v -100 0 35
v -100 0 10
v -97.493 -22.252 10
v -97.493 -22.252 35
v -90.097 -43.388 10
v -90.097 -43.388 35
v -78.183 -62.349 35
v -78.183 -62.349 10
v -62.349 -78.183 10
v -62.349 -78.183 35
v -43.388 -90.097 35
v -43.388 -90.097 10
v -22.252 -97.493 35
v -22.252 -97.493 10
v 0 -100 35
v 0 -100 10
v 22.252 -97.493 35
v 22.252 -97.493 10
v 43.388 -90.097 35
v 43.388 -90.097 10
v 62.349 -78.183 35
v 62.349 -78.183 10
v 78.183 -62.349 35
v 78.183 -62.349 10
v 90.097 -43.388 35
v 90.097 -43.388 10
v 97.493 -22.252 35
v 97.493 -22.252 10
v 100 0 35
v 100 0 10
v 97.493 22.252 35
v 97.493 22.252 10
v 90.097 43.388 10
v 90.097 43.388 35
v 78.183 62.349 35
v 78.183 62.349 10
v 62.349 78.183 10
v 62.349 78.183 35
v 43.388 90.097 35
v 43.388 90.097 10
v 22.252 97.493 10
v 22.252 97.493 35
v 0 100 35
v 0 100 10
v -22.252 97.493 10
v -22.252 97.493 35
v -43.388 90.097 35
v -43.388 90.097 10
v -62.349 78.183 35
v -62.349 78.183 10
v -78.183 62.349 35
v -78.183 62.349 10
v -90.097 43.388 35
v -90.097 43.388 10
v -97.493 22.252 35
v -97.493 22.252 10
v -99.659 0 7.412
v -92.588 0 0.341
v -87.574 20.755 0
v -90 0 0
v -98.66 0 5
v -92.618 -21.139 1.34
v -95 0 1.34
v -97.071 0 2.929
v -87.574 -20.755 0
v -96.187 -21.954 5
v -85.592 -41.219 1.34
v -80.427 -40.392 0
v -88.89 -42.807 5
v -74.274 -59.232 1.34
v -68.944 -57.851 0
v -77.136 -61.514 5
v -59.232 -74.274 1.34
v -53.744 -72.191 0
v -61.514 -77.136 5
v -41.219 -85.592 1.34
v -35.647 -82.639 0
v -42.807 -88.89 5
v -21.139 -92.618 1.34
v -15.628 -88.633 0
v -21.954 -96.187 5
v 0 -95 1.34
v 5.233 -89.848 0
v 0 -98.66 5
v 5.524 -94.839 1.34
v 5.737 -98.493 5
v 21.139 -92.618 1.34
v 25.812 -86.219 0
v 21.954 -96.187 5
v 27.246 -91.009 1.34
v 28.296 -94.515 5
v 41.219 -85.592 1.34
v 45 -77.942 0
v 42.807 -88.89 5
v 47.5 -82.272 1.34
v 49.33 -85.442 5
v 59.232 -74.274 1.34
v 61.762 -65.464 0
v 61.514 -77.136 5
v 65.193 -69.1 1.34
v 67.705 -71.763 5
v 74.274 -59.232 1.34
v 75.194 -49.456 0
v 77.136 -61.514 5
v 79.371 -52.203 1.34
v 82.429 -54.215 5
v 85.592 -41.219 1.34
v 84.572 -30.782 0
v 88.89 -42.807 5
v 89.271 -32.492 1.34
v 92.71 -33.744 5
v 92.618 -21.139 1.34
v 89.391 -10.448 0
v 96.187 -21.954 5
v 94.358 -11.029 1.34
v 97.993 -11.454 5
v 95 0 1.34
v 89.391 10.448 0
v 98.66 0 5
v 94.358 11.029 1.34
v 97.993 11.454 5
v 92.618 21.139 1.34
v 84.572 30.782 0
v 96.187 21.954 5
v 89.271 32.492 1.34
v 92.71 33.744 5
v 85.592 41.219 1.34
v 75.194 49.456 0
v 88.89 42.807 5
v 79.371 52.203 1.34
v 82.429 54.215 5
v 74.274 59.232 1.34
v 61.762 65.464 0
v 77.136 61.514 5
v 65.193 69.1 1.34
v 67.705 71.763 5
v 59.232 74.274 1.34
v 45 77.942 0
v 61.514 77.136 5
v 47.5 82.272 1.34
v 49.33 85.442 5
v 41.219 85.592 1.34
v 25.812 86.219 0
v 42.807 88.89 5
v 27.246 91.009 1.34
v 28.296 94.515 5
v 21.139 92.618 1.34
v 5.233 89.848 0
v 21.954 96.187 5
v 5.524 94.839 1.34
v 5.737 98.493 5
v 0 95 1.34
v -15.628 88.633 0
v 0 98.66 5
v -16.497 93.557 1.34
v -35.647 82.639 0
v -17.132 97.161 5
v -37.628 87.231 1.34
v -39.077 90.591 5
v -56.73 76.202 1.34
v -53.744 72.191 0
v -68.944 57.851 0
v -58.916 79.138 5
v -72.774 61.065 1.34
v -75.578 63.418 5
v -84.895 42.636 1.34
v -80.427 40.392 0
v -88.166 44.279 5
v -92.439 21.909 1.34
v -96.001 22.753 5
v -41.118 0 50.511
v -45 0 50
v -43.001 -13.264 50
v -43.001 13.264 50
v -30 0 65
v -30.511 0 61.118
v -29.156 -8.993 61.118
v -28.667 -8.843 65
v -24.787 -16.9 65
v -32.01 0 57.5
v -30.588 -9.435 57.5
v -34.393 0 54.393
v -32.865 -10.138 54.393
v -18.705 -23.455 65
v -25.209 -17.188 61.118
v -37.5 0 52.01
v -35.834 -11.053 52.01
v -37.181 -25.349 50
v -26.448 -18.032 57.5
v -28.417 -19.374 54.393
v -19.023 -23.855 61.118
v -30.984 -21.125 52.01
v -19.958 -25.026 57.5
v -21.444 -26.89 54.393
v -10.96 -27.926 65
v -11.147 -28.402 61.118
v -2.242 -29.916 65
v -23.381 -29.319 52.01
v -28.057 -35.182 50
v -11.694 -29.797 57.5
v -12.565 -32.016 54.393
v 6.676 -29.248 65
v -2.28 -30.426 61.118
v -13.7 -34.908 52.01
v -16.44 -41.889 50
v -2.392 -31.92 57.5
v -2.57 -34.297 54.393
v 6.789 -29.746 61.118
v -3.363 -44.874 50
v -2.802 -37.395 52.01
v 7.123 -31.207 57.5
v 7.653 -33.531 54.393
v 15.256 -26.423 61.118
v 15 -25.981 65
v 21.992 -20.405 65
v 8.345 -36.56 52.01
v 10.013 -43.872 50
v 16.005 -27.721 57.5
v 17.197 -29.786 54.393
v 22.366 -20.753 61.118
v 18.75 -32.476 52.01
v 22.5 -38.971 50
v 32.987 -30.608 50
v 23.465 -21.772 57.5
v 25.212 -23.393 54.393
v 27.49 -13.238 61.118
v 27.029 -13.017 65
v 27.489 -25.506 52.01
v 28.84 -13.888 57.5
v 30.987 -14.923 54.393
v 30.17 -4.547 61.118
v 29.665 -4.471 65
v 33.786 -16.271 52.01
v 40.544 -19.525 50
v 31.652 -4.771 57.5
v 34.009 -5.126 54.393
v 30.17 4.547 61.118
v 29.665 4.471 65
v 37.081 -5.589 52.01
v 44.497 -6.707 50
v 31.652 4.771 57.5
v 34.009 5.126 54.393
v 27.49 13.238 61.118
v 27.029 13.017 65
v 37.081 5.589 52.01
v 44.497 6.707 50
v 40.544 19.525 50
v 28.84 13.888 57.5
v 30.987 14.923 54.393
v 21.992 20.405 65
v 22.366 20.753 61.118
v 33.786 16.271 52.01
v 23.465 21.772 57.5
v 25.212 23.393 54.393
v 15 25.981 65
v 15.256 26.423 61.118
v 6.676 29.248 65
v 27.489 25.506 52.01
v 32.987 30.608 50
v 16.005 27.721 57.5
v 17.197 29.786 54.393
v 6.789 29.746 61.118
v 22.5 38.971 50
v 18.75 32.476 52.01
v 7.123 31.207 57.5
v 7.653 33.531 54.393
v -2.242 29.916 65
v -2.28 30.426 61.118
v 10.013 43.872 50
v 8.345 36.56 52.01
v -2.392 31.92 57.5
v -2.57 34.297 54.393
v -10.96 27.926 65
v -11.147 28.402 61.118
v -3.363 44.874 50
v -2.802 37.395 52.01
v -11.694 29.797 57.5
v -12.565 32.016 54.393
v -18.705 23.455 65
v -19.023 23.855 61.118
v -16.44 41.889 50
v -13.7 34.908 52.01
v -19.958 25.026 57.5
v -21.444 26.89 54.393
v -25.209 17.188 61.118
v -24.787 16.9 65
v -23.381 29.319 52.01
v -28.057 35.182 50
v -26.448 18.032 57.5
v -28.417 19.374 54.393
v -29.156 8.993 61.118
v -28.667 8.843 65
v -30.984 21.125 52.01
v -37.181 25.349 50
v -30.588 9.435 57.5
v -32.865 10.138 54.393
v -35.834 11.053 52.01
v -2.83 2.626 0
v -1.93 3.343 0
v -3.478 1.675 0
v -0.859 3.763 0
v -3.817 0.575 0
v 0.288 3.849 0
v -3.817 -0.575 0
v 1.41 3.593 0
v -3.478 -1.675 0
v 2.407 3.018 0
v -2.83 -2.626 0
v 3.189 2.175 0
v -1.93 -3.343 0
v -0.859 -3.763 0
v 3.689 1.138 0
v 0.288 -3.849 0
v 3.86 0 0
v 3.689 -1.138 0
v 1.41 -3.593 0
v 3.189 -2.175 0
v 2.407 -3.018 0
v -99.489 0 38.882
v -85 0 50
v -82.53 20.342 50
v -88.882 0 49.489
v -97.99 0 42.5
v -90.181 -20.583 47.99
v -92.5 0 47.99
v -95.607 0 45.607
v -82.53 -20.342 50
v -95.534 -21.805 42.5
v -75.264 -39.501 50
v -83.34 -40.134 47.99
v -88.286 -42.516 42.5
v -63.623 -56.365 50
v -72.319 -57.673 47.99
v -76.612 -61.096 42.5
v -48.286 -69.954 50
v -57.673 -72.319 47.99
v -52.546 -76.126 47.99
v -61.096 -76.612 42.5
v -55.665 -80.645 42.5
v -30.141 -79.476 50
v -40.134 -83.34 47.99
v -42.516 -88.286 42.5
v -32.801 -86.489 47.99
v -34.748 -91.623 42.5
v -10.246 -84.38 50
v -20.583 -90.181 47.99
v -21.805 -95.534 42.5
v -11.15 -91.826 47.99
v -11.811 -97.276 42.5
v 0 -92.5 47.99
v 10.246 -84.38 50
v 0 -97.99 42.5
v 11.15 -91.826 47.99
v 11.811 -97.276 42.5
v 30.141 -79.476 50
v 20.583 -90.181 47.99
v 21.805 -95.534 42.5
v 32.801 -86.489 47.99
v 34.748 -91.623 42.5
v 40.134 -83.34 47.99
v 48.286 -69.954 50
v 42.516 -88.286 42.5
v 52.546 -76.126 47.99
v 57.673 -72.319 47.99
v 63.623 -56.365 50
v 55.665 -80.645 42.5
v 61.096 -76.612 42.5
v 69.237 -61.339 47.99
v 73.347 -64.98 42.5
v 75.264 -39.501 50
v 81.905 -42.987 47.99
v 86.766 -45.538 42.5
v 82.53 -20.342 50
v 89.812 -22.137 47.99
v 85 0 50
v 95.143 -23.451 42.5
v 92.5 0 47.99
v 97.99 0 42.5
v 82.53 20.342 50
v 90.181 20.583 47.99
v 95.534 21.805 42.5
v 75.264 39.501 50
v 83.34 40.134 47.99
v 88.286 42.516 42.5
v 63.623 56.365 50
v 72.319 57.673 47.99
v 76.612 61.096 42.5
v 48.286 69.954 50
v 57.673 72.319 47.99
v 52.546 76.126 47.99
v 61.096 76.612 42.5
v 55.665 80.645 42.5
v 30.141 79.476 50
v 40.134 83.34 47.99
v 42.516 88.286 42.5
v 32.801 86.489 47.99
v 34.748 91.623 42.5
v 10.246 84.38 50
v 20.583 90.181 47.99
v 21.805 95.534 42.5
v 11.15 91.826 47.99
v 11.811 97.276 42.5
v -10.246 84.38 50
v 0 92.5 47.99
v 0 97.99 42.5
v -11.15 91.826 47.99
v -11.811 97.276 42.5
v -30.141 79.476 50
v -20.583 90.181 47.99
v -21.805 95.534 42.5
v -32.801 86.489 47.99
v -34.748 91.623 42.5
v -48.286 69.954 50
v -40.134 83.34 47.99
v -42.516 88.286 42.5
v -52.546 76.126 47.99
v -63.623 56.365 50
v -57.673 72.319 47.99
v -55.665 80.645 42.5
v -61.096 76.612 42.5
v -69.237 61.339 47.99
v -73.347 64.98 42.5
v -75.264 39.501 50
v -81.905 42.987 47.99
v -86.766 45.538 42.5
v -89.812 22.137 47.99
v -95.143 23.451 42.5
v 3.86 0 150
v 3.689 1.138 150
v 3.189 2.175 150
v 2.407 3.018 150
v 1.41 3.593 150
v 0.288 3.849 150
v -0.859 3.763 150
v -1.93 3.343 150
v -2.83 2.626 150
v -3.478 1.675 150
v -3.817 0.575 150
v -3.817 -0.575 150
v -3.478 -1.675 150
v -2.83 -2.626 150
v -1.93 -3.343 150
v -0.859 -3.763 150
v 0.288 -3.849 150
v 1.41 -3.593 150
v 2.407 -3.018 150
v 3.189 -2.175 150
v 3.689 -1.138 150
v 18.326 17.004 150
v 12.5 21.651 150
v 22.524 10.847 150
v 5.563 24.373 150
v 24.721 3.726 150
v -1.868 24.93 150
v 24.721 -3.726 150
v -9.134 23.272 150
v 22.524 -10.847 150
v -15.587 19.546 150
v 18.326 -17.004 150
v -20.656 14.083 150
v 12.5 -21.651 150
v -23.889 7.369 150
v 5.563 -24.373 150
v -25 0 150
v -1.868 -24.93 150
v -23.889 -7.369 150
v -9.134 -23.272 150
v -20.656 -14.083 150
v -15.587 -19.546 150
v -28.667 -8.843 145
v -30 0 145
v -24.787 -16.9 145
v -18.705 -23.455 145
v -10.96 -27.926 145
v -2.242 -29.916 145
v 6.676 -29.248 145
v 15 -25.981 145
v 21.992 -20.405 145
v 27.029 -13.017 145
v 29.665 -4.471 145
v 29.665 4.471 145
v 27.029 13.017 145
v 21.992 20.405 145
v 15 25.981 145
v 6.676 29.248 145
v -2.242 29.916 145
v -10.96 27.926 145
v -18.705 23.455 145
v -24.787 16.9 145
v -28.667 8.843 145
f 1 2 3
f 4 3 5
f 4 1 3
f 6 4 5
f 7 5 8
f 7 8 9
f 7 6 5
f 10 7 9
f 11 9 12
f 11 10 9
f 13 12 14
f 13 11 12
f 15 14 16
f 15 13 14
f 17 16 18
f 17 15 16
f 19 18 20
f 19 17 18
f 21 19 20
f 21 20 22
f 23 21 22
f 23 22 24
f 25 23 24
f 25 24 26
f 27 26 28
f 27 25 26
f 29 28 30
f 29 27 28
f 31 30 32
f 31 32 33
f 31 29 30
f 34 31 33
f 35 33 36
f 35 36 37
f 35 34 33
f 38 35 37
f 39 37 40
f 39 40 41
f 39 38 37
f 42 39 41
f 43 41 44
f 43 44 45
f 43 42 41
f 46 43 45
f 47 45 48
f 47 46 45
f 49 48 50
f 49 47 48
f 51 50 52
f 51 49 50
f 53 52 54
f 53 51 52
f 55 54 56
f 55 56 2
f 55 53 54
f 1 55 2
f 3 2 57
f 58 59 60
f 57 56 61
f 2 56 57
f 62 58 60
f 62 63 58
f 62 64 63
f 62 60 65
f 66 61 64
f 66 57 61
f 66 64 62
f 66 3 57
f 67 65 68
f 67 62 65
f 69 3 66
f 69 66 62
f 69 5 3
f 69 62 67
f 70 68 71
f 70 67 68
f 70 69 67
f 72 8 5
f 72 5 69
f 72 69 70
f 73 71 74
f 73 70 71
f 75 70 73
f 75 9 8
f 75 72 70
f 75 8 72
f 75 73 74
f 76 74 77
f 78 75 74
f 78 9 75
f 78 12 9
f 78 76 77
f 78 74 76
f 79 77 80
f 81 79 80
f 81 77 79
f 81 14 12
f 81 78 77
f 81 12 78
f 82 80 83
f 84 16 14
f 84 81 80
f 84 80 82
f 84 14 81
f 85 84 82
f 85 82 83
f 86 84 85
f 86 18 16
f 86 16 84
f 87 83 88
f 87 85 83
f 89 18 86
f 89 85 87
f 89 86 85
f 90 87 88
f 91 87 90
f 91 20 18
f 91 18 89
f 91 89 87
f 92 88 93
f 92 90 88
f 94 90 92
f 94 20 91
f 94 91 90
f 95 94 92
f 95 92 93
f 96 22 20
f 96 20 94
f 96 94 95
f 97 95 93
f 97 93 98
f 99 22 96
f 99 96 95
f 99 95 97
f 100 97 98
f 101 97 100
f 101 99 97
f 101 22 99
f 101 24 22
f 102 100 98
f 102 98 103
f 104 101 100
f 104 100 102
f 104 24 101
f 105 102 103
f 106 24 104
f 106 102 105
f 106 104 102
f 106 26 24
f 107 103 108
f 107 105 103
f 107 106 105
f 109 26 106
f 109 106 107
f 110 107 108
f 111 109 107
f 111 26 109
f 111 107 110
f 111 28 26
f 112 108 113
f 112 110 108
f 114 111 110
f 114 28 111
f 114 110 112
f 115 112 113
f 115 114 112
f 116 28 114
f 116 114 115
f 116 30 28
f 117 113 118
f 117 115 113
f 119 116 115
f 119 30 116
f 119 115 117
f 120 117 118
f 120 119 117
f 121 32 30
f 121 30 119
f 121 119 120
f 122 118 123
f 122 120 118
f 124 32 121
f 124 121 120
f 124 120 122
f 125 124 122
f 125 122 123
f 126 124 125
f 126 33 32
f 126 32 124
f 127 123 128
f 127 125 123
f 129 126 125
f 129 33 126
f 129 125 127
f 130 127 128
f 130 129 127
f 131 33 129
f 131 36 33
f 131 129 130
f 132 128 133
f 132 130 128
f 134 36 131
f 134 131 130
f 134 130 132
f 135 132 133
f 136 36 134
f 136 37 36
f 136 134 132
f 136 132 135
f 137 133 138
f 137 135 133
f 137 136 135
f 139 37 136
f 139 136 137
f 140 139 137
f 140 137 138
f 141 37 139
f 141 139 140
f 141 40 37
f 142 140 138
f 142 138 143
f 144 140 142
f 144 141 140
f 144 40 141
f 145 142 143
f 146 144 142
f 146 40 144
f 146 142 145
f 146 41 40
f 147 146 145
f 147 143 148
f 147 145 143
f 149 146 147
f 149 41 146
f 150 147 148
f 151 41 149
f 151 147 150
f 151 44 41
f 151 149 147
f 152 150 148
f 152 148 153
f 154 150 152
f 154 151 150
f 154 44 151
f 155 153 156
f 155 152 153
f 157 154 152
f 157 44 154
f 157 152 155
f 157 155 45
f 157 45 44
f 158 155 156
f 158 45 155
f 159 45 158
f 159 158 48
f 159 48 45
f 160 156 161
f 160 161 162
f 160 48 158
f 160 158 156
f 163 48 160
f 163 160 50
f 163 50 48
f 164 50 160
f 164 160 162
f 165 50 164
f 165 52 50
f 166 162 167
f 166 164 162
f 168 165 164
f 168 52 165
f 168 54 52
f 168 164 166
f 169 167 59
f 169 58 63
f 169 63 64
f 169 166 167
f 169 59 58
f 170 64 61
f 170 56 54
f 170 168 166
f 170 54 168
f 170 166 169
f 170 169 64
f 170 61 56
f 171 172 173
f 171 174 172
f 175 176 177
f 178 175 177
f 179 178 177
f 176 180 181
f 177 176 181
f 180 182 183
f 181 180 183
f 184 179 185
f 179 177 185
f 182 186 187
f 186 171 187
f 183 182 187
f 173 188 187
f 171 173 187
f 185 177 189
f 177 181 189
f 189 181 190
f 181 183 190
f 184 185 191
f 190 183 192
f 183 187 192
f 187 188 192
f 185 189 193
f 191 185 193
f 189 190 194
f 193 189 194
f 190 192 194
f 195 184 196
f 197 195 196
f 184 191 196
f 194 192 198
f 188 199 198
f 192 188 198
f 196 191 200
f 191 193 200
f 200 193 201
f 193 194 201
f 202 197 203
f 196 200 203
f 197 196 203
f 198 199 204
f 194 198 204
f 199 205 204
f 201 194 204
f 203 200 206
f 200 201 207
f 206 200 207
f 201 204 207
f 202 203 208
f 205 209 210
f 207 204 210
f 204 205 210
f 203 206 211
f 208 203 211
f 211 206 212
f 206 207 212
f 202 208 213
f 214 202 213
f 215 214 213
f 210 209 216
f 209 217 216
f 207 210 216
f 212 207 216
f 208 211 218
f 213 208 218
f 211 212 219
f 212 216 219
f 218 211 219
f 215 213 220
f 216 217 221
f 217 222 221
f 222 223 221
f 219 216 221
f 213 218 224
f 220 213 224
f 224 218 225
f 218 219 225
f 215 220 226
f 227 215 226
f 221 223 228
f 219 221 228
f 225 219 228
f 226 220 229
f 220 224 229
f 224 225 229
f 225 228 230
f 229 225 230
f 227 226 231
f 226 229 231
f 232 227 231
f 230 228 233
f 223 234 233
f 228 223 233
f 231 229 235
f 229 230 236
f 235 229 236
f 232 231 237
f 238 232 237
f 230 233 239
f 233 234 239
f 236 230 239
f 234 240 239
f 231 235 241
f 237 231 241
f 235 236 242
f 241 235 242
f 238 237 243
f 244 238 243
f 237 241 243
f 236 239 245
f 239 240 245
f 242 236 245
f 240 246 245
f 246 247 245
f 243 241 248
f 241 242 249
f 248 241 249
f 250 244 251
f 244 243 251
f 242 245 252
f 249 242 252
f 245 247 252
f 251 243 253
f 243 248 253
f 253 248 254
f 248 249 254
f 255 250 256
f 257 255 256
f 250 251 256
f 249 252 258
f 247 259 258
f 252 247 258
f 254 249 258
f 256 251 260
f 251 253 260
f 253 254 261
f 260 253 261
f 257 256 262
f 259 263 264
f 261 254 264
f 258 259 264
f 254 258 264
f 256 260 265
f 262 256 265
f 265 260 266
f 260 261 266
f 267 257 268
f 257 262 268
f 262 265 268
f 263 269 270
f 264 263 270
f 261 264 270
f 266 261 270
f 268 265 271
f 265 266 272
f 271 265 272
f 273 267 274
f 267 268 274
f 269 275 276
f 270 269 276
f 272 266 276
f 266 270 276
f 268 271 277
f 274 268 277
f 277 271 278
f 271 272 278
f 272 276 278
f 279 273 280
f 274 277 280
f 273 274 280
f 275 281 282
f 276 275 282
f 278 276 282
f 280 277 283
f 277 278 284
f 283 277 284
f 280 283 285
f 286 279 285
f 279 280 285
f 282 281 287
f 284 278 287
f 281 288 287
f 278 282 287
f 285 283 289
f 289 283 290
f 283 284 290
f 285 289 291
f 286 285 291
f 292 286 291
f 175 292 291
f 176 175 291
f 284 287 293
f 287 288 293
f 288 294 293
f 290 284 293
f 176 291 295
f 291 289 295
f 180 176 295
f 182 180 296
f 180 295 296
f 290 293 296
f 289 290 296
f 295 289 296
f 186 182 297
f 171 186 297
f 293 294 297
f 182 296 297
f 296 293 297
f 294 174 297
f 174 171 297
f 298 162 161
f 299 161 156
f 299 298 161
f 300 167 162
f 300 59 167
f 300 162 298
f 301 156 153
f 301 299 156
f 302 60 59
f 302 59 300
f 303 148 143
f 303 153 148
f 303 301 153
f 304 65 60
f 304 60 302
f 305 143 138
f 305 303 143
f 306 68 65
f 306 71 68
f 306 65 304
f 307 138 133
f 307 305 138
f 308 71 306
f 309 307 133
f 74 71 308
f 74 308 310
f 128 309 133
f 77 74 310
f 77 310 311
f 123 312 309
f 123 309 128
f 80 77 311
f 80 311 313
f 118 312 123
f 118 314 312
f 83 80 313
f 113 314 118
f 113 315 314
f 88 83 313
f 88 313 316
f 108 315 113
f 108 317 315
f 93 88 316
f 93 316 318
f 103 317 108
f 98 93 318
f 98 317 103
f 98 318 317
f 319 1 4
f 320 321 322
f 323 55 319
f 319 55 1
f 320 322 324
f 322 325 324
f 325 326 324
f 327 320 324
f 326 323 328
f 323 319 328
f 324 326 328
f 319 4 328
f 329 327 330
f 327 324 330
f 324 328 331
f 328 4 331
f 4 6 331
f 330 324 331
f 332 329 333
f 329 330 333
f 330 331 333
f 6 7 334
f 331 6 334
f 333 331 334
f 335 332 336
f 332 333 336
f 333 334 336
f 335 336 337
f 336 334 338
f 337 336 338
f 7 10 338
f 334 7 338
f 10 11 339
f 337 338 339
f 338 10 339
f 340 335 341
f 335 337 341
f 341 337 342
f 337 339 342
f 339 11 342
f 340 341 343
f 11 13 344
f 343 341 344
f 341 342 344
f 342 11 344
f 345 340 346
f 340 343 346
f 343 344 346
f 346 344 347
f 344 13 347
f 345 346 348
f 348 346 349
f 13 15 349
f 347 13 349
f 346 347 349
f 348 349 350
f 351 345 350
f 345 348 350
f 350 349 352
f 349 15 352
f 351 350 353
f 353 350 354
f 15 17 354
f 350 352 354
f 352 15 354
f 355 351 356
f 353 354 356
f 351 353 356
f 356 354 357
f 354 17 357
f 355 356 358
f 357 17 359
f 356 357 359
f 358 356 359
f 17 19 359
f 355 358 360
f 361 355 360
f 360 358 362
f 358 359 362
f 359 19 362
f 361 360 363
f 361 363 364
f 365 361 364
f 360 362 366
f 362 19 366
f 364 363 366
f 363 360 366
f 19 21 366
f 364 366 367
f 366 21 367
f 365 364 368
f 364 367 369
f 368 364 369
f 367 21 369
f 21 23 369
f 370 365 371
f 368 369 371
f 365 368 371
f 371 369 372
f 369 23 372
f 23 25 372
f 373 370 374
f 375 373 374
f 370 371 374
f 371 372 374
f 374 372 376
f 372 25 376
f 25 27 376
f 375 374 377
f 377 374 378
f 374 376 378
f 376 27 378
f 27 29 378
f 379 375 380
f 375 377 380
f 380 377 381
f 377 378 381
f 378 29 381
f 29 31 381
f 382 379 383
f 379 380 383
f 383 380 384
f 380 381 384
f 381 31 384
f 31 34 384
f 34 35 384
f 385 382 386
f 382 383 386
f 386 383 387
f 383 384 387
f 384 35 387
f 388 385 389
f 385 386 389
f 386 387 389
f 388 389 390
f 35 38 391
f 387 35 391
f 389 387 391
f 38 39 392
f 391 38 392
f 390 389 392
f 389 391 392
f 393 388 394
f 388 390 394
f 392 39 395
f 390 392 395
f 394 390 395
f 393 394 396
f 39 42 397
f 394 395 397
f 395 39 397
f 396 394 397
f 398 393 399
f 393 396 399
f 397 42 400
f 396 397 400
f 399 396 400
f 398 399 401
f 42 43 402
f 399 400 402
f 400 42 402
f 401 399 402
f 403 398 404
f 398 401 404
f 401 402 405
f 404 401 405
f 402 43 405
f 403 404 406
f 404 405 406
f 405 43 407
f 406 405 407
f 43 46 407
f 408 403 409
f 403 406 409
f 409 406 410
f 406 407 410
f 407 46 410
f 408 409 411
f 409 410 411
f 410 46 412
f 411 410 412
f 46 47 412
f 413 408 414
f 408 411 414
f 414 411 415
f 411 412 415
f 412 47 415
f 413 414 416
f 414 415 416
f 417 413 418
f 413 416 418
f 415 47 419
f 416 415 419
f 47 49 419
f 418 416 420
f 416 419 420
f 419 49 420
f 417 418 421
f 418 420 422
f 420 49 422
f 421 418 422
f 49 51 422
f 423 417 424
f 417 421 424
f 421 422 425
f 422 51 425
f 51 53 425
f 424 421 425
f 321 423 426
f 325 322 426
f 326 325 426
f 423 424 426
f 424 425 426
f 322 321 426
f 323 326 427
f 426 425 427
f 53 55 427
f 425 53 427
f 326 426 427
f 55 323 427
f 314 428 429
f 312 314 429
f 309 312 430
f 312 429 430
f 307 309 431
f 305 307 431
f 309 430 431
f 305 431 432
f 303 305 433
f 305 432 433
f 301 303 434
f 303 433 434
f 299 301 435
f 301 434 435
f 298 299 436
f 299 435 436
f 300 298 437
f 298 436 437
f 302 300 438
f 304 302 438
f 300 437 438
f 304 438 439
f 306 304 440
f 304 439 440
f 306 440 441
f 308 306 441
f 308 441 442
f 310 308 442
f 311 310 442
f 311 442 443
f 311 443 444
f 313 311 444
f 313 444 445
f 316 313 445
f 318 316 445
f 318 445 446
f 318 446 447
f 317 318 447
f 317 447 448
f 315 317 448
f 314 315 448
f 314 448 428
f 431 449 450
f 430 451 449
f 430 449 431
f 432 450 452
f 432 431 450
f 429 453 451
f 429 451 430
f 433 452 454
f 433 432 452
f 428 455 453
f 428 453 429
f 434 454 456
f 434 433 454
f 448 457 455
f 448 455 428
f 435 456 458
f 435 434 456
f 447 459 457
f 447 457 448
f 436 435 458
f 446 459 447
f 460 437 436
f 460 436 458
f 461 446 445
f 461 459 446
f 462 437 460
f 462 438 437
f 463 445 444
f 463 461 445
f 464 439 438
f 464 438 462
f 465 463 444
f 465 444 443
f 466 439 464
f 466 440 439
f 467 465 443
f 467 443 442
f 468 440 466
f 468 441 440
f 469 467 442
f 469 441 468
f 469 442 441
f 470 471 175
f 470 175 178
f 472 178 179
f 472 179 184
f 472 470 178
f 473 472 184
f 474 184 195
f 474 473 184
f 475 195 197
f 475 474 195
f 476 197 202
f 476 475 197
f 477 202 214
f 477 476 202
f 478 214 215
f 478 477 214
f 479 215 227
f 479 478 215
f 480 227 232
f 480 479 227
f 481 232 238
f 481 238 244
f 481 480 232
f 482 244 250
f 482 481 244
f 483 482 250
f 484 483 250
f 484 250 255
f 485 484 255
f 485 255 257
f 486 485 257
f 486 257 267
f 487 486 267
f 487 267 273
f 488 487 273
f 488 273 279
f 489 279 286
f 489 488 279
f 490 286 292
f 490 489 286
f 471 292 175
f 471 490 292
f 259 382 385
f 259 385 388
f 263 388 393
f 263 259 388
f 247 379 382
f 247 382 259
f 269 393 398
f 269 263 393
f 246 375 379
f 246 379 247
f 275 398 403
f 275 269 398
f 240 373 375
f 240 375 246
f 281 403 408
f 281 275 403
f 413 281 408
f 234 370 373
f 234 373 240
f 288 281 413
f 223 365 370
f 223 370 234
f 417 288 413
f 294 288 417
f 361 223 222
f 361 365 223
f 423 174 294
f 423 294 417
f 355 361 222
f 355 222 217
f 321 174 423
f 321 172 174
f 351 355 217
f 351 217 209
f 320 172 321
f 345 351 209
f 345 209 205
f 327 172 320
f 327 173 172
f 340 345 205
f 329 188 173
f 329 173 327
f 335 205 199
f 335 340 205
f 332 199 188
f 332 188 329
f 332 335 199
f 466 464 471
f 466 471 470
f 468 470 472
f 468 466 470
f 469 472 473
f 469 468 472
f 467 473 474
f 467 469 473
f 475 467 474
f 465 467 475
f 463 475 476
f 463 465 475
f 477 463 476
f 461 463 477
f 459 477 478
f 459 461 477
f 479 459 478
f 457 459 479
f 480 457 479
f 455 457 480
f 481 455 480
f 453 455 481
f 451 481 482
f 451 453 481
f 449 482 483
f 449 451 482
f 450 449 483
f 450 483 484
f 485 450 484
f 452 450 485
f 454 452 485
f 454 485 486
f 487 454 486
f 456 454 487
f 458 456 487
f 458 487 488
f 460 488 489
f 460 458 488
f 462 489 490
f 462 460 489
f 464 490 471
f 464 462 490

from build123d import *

# Parameters (mm, degrees)
FILLET1_R          = 10
CHAMFER1_SIZE      = 5
FILLET2_R          = 15
SKETCH2_R          = 3.860242373
CUT_EXTRUDE1_DEPTH = 151


with BuildPart() as part:
    # Sketch1 → Revolve1 (revolve)
    with BuildSketch(Plane(origin=(0, 0, 0), x_dir=(1, 0, 0), z_dir=(0, 1, 0)), mode=Mode.PRIVATE) as revolve1_sk:
        Polygon((0, 0), (100, 0), (100, -50), (30, -50), (30, -150), (0, -150), align=None)
    revolve(revolve1_sk.sketch.rotate(Axis((0, 0, -26.959763618), (0, 0, 1)), 180), axis=Axis((0, 0, -26.959763618), (0, 0, 1)))  # turned: the seam where the file's is

    # Fillet1
    fillet1_edges = [part.edges().sort_by_distance(p)[0] for p in [
        (100, 0, 0),
    ]]
    fillet(fillet1_edges, radius=FILLET1_R)

    # Chamfer1
    chamfer1_edges = [part.edges().sort_by_distance(p)[0] for p in [
        (30, 0, 150),
    ]]
    chamfer(chamfer1_edges, length=CHAMFER1_SIZE)

    # Fillet2
    fillet2_edges = [part.edges().sort_by_distance(p)[0] for p in [
        (30, 0, 50),
        (100, 0, 50),
    ]]
    fillet(fillet2_edges, radius=FILLET2_R)

    # Sketch2 → Cut-Extrude1 (cut, through all)
    with BuildSketch(Plane.XY.offset(150)):
        Circle(SKETCH2_R)
    extrude(amount=-CUT_EXTRUDE1_DEPTH, mode=Mode.SUBTRACT)


solid = part.part
